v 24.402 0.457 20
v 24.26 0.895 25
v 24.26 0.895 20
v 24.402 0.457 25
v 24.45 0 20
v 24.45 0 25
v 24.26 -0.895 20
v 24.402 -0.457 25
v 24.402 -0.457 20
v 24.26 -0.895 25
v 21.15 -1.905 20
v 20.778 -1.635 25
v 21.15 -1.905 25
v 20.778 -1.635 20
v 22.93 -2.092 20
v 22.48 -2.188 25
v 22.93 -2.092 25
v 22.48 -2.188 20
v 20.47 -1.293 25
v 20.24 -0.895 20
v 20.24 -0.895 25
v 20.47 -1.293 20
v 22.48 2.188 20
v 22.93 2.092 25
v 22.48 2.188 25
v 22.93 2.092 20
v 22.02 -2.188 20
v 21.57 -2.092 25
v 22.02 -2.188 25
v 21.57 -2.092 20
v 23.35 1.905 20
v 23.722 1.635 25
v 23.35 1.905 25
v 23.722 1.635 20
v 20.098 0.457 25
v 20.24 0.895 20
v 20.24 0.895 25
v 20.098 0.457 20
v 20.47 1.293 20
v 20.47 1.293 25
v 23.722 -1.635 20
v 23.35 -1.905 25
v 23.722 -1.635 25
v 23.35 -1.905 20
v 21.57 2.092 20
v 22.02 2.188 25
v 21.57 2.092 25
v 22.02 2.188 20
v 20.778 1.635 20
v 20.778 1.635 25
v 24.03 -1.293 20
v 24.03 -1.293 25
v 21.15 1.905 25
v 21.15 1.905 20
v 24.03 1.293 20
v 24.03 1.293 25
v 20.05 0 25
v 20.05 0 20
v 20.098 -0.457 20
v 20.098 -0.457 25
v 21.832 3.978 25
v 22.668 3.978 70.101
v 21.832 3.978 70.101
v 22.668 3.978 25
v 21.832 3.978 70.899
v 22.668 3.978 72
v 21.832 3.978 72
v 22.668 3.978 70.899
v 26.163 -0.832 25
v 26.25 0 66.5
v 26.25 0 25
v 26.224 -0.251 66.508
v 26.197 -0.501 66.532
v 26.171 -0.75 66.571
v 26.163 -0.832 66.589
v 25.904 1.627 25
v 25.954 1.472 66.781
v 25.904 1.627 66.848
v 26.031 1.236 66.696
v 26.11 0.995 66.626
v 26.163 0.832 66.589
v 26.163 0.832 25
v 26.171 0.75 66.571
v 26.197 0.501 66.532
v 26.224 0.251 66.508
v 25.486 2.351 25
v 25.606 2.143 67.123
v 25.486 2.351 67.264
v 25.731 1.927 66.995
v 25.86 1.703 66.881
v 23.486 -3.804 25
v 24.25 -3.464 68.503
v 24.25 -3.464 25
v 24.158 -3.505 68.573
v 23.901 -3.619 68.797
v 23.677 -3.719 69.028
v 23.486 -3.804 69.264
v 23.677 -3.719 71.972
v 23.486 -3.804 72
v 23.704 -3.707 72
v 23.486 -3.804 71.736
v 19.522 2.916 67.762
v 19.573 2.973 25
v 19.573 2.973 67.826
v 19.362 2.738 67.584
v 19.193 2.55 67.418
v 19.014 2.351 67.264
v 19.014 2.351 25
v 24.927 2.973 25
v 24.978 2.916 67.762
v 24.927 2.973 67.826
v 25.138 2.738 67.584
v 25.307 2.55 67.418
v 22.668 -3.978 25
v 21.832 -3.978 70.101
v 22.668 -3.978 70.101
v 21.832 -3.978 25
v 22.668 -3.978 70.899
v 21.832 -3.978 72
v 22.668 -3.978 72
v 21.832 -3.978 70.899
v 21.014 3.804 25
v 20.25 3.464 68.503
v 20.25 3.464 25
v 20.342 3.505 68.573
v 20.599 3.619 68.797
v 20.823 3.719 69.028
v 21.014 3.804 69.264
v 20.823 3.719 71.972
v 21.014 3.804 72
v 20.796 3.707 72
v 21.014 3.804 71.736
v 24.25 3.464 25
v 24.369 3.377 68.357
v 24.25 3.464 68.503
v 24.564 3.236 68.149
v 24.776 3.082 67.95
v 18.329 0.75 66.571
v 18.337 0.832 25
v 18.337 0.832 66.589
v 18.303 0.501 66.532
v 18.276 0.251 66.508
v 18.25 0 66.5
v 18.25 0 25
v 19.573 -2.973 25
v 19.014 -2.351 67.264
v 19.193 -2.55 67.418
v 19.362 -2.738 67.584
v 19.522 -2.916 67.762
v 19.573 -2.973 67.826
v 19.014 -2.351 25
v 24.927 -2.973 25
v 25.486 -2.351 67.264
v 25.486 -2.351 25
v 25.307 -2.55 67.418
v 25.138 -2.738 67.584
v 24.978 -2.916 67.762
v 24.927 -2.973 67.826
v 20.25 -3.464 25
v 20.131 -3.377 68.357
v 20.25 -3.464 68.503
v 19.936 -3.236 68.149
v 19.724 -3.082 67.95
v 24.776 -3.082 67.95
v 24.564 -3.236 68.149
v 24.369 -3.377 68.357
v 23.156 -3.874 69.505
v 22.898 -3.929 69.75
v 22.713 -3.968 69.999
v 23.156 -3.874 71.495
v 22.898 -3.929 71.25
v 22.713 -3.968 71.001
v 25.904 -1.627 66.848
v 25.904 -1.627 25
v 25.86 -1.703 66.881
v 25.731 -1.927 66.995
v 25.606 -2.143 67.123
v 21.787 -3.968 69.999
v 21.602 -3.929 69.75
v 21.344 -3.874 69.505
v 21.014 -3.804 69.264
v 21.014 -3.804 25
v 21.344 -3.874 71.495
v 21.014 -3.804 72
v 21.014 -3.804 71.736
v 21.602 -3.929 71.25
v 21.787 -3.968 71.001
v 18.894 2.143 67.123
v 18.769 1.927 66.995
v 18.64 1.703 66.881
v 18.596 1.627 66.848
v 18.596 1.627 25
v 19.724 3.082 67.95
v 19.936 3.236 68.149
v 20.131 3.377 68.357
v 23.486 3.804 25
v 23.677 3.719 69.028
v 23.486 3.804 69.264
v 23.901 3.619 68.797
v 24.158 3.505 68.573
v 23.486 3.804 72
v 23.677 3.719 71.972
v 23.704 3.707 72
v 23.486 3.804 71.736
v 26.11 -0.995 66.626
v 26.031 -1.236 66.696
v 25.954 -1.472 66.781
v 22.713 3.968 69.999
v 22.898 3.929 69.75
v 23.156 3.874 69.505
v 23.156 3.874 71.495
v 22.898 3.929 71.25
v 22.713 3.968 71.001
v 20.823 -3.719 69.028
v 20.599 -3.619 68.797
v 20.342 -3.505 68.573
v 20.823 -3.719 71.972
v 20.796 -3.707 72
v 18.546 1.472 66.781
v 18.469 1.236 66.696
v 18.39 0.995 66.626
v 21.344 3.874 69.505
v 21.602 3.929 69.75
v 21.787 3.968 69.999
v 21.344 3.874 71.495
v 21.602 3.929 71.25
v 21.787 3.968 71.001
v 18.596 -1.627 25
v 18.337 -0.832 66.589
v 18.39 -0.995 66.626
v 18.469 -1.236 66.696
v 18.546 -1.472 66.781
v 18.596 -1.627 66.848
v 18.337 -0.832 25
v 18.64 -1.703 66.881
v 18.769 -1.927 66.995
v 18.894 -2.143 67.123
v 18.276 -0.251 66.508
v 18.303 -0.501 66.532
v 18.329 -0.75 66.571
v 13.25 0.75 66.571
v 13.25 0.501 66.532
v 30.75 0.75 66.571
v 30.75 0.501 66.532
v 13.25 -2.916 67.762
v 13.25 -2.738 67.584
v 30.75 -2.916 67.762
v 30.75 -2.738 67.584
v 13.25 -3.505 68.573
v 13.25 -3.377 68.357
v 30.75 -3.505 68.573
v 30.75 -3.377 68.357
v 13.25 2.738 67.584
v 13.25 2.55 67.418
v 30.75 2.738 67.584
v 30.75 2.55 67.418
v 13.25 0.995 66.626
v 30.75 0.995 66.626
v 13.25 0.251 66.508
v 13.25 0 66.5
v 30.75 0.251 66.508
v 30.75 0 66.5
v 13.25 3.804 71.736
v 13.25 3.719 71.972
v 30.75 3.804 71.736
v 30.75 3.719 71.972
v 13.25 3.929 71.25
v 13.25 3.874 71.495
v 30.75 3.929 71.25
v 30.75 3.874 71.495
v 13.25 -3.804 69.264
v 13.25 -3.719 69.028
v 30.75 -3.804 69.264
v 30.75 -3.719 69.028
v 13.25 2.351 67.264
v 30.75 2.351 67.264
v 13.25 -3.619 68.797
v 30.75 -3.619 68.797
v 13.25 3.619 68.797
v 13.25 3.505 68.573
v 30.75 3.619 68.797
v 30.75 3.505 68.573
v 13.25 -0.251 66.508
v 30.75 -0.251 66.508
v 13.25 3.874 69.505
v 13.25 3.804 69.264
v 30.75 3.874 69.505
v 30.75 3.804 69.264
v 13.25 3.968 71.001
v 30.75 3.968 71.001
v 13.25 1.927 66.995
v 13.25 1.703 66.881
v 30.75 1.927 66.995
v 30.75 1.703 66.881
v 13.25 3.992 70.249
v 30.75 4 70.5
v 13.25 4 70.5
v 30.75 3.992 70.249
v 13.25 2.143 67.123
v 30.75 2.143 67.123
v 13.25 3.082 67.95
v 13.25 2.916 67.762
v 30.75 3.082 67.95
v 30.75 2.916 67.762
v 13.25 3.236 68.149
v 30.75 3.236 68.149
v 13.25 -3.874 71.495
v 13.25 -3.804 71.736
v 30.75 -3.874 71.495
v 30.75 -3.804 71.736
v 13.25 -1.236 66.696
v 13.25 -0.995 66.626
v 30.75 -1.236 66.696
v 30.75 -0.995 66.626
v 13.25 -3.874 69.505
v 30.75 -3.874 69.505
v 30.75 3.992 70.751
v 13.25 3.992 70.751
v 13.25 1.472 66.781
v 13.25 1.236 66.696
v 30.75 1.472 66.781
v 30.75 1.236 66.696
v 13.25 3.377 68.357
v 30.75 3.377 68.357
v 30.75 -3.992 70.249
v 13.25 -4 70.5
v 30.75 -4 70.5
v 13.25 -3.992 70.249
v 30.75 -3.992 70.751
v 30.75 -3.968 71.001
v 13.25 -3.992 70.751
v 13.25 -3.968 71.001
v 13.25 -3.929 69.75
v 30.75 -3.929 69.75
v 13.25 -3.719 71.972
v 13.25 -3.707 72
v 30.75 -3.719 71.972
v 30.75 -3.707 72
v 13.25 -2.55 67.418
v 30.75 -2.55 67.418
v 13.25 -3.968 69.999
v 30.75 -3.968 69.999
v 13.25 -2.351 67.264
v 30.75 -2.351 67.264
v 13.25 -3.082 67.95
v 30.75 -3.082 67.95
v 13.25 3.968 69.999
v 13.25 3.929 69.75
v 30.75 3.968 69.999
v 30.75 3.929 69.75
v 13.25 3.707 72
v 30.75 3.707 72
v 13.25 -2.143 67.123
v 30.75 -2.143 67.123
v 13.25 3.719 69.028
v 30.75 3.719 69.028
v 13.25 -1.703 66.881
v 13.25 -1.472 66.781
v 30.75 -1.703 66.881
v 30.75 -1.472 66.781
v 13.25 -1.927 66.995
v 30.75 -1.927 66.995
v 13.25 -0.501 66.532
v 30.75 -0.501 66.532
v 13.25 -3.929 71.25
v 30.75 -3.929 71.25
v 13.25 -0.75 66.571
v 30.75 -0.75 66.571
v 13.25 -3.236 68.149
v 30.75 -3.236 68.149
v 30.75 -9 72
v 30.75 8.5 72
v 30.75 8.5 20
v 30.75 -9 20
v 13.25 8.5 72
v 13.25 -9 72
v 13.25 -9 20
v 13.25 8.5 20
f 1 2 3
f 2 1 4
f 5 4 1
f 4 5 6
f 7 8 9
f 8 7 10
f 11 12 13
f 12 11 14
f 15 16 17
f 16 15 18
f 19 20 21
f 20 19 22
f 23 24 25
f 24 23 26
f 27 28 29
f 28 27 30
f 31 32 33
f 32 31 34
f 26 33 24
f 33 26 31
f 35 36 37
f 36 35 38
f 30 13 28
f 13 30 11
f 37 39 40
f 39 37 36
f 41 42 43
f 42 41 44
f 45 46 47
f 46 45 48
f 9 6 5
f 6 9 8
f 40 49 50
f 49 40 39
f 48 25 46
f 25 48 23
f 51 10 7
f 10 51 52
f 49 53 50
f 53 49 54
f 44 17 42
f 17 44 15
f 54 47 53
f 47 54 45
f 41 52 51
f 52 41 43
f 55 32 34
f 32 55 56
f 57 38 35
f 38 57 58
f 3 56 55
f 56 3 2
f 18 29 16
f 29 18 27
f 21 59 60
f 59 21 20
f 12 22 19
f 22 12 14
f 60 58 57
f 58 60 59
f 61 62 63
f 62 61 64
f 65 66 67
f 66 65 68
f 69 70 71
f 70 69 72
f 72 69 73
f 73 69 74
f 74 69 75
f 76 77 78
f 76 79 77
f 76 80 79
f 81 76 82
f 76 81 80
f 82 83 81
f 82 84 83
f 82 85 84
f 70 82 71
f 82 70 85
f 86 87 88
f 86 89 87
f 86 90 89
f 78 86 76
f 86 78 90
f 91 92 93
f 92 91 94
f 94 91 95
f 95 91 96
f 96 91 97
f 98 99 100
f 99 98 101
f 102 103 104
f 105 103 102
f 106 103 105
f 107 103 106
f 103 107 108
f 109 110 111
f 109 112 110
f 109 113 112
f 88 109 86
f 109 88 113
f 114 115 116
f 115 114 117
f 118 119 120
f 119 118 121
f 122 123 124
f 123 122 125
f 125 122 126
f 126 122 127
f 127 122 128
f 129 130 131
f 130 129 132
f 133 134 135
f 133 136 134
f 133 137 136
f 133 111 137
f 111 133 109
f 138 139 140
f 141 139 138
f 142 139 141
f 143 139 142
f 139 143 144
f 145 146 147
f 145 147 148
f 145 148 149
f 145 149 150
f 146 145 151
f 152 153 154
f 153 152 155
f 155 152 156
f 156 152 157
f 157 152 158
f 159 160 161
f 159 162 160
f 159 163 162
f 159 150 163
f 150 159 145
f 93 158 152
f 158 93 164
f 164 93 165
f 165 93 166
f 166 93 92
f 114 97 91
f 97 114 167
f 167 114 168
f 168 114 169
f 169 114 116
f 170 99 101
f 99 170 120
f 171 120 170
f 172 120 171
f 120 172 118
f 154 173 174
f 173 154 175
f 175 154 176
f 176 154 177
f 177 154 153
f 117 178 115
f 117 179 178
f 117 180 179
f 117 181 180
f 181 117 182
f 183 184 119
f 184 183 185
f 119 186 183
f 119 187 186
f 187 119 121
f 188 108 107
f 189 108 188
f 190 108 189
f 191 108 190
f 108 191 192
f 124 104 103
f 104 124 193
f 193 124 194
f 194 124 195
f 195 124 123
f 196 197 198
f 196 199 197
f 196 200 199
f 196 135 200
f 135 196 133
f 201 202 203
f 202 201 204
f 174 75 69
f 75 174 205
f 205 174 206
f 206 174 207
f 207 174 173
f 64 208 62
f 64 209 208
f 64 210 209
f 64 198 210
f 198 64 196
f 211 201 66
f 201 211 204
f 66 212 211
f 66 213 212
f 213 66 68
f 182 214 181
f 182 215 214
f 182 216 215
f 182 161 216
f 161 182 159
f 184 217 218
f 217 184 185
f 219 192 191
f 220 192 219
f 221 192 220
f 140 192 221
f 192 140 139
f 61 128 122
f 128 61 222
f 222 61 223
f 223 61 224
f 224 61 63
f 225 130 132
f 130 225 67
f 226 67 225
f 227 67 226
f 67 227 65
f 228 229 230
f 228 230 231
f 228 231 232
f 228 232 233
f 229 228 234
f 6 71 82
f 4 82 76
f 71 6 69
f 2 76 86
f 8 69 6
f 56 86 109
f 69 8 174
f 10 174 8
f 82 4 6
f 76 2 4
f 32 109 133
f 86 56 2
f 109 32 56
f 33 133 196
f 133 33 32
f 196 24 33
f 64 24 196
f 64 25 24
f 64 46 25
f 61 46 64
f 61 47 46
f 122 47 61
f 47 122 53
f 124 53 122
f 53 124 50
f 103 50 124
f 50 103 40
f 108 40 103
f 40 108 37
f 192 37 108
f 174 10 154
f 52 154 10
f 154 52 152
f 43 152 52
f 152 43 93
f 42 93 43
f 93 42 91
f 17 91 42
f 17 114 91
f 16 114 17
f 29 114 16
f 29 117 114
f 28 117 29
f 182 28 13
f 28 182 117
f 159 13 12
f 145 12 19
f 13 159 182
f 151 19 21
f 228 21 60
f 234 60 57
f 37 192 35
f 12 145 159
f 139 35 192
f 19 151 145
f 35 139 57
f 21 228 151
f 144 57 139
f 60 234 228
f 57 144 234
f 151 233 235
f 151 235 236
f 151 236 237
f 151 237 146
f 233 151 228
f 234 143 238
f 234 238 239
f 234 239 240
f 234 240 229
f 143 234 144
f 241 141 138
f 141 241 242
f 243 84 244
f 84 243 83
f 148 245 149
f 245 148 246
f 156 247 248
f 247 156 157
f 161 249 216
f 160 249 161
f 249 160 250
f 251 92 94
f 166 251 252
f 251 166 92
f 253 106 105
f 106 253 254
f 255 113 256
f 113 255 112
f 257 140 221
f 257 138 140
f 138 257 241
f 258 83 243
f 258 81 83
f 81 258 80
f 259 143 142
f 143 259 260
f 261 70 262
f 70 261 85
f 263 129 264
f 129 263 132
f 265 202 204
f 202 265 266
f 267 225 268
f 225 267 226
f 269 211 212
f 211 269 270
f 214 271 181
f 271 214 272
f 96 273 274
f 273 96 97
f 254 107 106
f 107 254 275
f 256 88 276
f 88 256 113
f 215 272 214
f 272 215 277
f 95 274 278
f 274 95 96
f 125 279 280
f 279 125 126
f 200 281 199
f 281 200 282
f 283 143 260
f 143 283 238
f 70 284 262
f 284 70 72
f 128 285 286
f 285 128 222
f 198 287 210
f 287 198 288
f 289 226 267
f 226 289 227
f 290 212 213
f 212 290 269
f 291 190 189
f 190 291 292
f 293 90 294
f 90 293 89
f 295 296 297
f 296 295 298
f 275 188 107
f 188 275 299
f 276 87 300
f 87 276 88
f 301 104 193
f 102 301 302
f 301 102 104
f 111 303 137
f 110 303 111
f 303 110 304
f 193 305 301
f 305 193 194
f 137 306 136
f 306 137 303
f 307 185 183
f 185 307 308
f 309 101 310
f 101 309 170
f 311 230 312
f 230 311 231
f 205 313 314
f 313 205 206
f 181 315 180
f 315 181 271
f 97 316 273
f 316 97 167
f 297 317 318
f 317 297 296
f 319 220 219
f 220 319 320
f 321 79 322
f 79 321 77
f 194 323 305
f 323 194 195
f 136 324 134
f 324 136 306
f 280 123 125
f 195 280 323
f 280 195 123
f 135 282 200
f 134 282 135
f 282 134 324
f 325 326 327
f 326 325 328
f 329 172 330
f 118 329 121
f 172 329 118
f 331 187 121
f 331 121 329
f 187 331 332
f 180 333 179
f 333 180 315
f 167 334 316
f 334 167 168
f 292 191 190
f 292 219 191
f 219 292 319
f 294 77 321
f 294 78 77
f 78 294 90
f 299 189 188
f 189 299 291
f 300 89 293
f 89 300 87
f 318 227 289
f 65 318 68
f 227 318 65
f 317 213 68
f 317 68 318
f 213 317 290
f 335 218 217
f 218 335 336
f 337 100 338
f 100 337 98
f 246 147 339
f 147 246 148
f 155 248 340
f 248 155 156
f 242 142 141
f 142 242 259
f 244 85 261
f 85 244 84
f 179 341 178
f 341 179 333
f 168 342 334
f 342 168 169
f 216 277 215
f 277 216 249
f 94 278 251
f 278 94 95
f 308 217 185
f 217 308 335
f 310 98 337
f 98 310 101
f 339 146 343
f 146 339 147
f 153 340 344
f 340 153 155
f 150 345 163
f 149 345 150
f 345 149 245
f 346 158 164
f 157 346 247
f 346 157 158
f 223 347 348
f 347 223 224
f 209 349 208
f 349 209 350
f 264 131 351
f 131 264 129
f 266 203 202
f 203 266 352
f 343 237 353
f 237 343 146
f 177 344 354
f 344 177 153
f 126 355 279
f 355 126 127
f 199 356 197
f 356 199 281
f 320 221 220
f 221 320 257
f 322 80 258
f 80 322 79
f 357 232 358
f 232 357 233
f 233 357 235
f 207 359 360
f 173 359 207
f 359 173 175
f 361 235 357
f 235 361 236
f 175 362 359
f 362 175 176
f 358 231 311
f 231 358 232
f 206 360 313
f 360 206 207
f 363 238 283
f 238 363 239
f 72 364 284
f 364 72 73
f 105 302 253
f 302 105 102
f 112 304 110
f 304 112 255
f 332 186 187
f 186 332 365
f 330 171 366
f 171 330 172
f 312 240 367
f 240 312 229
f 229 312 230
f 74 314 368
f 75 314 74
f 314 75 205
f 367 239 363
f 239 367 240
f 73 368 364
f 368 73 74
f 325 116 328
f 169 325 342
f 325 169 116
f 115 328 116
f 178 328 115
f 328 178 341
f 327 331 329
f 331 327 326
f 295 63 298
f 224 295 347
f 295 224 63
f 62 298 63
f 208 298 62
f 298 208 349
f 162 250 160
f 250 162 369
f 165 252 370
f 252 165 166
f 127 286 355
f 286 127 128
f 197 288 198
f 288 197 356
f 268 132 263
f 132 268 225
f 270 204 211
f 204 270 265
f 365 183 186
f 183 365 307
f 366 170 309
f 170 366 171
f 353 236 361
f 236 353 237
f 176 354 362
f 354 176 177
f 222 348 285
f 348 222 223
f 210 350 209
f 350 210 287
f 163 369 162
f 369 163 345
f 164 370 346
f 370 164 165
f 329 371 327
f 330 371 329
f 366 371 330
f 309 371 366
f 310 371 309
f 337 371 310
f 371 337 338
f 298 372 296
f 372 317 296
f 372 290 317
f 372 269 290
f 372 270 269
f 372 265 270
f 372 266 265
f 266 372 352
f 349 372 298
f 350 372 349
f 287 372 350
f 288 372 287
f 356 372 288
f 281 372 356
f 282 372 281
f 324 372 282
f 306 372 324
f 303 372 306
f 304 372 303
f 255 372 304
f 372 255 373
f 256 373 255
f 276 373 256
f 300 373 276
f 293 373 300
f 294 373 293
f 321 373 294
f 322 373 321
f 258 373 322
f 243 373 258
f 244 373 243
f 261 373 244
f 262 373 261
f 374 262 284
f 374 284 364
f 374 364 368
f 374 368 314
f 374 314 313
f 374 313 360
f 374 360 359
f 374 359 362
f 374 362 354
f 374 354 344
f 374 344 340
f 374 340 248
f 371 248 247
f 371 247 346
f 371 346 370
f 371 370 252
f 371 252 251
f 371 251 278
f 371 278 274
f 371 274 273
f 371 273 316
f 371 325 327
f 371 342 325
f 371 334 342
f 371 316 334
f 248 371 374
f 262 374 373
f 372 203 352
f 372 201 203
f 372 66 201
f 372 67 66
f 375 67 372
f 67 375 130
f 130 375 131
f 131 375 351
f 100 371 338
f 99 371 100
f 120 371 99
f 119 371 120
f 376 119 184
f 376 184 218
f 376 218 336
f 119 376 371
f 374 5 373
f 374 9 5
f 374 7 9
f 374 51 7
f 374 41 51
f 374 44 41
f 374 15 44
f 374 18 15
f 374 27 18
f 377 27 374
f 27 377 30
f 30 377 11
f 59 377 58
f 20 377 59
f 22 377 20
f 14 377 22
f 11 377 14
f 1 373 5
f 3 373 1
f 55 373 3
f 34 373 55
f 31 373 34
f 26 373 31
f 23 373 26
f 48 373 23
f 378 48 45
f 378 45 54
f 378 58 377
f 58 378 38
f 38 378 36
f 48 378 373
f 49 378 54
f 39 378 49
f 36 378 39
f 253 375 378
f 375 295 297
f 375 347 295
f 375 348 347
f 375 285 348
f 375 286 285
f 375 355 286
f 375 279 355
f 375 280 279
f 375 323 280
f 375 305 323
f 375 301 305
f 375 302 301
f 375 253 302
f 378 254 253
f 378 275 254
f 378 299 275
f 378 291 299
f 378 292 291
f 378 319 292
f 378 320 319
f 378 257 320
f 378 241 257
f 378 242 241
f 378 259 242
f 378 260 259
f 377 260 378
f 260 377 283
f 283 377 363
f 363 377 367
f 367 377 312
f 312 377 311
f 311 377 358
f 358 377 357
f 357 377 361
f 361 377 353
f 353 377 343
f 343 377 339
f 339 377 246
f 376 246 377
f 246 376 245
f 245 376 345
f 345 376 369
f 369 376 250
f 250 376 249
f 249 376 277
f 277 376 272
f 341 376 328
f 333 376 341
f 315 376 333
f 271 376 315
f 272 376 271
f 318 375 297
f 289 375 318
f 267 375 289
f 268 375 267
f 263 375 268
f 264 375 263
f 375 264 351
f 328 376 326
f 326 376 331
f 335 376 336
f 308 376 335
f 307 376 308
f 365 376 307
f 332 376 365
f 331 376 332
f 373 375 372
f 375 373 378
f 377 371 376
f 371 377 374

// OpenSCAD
difference(){
 translate([22-17.5/2,-22/2+2,20])cube([17.5,17.5,52]);

union(){
 translate([22-17.5/2+9,0,-1])cylinder(r=2.2,h=100,$fn=30);
 translate([22-17.5/2+9,0,5+20])cylinder(r=4,h=100,$fn=30);
 translate([0,0,52-1.5+20]) rotate([0,90,0])cylinder(r=4,h=1000,$fn=100);
} 

}
